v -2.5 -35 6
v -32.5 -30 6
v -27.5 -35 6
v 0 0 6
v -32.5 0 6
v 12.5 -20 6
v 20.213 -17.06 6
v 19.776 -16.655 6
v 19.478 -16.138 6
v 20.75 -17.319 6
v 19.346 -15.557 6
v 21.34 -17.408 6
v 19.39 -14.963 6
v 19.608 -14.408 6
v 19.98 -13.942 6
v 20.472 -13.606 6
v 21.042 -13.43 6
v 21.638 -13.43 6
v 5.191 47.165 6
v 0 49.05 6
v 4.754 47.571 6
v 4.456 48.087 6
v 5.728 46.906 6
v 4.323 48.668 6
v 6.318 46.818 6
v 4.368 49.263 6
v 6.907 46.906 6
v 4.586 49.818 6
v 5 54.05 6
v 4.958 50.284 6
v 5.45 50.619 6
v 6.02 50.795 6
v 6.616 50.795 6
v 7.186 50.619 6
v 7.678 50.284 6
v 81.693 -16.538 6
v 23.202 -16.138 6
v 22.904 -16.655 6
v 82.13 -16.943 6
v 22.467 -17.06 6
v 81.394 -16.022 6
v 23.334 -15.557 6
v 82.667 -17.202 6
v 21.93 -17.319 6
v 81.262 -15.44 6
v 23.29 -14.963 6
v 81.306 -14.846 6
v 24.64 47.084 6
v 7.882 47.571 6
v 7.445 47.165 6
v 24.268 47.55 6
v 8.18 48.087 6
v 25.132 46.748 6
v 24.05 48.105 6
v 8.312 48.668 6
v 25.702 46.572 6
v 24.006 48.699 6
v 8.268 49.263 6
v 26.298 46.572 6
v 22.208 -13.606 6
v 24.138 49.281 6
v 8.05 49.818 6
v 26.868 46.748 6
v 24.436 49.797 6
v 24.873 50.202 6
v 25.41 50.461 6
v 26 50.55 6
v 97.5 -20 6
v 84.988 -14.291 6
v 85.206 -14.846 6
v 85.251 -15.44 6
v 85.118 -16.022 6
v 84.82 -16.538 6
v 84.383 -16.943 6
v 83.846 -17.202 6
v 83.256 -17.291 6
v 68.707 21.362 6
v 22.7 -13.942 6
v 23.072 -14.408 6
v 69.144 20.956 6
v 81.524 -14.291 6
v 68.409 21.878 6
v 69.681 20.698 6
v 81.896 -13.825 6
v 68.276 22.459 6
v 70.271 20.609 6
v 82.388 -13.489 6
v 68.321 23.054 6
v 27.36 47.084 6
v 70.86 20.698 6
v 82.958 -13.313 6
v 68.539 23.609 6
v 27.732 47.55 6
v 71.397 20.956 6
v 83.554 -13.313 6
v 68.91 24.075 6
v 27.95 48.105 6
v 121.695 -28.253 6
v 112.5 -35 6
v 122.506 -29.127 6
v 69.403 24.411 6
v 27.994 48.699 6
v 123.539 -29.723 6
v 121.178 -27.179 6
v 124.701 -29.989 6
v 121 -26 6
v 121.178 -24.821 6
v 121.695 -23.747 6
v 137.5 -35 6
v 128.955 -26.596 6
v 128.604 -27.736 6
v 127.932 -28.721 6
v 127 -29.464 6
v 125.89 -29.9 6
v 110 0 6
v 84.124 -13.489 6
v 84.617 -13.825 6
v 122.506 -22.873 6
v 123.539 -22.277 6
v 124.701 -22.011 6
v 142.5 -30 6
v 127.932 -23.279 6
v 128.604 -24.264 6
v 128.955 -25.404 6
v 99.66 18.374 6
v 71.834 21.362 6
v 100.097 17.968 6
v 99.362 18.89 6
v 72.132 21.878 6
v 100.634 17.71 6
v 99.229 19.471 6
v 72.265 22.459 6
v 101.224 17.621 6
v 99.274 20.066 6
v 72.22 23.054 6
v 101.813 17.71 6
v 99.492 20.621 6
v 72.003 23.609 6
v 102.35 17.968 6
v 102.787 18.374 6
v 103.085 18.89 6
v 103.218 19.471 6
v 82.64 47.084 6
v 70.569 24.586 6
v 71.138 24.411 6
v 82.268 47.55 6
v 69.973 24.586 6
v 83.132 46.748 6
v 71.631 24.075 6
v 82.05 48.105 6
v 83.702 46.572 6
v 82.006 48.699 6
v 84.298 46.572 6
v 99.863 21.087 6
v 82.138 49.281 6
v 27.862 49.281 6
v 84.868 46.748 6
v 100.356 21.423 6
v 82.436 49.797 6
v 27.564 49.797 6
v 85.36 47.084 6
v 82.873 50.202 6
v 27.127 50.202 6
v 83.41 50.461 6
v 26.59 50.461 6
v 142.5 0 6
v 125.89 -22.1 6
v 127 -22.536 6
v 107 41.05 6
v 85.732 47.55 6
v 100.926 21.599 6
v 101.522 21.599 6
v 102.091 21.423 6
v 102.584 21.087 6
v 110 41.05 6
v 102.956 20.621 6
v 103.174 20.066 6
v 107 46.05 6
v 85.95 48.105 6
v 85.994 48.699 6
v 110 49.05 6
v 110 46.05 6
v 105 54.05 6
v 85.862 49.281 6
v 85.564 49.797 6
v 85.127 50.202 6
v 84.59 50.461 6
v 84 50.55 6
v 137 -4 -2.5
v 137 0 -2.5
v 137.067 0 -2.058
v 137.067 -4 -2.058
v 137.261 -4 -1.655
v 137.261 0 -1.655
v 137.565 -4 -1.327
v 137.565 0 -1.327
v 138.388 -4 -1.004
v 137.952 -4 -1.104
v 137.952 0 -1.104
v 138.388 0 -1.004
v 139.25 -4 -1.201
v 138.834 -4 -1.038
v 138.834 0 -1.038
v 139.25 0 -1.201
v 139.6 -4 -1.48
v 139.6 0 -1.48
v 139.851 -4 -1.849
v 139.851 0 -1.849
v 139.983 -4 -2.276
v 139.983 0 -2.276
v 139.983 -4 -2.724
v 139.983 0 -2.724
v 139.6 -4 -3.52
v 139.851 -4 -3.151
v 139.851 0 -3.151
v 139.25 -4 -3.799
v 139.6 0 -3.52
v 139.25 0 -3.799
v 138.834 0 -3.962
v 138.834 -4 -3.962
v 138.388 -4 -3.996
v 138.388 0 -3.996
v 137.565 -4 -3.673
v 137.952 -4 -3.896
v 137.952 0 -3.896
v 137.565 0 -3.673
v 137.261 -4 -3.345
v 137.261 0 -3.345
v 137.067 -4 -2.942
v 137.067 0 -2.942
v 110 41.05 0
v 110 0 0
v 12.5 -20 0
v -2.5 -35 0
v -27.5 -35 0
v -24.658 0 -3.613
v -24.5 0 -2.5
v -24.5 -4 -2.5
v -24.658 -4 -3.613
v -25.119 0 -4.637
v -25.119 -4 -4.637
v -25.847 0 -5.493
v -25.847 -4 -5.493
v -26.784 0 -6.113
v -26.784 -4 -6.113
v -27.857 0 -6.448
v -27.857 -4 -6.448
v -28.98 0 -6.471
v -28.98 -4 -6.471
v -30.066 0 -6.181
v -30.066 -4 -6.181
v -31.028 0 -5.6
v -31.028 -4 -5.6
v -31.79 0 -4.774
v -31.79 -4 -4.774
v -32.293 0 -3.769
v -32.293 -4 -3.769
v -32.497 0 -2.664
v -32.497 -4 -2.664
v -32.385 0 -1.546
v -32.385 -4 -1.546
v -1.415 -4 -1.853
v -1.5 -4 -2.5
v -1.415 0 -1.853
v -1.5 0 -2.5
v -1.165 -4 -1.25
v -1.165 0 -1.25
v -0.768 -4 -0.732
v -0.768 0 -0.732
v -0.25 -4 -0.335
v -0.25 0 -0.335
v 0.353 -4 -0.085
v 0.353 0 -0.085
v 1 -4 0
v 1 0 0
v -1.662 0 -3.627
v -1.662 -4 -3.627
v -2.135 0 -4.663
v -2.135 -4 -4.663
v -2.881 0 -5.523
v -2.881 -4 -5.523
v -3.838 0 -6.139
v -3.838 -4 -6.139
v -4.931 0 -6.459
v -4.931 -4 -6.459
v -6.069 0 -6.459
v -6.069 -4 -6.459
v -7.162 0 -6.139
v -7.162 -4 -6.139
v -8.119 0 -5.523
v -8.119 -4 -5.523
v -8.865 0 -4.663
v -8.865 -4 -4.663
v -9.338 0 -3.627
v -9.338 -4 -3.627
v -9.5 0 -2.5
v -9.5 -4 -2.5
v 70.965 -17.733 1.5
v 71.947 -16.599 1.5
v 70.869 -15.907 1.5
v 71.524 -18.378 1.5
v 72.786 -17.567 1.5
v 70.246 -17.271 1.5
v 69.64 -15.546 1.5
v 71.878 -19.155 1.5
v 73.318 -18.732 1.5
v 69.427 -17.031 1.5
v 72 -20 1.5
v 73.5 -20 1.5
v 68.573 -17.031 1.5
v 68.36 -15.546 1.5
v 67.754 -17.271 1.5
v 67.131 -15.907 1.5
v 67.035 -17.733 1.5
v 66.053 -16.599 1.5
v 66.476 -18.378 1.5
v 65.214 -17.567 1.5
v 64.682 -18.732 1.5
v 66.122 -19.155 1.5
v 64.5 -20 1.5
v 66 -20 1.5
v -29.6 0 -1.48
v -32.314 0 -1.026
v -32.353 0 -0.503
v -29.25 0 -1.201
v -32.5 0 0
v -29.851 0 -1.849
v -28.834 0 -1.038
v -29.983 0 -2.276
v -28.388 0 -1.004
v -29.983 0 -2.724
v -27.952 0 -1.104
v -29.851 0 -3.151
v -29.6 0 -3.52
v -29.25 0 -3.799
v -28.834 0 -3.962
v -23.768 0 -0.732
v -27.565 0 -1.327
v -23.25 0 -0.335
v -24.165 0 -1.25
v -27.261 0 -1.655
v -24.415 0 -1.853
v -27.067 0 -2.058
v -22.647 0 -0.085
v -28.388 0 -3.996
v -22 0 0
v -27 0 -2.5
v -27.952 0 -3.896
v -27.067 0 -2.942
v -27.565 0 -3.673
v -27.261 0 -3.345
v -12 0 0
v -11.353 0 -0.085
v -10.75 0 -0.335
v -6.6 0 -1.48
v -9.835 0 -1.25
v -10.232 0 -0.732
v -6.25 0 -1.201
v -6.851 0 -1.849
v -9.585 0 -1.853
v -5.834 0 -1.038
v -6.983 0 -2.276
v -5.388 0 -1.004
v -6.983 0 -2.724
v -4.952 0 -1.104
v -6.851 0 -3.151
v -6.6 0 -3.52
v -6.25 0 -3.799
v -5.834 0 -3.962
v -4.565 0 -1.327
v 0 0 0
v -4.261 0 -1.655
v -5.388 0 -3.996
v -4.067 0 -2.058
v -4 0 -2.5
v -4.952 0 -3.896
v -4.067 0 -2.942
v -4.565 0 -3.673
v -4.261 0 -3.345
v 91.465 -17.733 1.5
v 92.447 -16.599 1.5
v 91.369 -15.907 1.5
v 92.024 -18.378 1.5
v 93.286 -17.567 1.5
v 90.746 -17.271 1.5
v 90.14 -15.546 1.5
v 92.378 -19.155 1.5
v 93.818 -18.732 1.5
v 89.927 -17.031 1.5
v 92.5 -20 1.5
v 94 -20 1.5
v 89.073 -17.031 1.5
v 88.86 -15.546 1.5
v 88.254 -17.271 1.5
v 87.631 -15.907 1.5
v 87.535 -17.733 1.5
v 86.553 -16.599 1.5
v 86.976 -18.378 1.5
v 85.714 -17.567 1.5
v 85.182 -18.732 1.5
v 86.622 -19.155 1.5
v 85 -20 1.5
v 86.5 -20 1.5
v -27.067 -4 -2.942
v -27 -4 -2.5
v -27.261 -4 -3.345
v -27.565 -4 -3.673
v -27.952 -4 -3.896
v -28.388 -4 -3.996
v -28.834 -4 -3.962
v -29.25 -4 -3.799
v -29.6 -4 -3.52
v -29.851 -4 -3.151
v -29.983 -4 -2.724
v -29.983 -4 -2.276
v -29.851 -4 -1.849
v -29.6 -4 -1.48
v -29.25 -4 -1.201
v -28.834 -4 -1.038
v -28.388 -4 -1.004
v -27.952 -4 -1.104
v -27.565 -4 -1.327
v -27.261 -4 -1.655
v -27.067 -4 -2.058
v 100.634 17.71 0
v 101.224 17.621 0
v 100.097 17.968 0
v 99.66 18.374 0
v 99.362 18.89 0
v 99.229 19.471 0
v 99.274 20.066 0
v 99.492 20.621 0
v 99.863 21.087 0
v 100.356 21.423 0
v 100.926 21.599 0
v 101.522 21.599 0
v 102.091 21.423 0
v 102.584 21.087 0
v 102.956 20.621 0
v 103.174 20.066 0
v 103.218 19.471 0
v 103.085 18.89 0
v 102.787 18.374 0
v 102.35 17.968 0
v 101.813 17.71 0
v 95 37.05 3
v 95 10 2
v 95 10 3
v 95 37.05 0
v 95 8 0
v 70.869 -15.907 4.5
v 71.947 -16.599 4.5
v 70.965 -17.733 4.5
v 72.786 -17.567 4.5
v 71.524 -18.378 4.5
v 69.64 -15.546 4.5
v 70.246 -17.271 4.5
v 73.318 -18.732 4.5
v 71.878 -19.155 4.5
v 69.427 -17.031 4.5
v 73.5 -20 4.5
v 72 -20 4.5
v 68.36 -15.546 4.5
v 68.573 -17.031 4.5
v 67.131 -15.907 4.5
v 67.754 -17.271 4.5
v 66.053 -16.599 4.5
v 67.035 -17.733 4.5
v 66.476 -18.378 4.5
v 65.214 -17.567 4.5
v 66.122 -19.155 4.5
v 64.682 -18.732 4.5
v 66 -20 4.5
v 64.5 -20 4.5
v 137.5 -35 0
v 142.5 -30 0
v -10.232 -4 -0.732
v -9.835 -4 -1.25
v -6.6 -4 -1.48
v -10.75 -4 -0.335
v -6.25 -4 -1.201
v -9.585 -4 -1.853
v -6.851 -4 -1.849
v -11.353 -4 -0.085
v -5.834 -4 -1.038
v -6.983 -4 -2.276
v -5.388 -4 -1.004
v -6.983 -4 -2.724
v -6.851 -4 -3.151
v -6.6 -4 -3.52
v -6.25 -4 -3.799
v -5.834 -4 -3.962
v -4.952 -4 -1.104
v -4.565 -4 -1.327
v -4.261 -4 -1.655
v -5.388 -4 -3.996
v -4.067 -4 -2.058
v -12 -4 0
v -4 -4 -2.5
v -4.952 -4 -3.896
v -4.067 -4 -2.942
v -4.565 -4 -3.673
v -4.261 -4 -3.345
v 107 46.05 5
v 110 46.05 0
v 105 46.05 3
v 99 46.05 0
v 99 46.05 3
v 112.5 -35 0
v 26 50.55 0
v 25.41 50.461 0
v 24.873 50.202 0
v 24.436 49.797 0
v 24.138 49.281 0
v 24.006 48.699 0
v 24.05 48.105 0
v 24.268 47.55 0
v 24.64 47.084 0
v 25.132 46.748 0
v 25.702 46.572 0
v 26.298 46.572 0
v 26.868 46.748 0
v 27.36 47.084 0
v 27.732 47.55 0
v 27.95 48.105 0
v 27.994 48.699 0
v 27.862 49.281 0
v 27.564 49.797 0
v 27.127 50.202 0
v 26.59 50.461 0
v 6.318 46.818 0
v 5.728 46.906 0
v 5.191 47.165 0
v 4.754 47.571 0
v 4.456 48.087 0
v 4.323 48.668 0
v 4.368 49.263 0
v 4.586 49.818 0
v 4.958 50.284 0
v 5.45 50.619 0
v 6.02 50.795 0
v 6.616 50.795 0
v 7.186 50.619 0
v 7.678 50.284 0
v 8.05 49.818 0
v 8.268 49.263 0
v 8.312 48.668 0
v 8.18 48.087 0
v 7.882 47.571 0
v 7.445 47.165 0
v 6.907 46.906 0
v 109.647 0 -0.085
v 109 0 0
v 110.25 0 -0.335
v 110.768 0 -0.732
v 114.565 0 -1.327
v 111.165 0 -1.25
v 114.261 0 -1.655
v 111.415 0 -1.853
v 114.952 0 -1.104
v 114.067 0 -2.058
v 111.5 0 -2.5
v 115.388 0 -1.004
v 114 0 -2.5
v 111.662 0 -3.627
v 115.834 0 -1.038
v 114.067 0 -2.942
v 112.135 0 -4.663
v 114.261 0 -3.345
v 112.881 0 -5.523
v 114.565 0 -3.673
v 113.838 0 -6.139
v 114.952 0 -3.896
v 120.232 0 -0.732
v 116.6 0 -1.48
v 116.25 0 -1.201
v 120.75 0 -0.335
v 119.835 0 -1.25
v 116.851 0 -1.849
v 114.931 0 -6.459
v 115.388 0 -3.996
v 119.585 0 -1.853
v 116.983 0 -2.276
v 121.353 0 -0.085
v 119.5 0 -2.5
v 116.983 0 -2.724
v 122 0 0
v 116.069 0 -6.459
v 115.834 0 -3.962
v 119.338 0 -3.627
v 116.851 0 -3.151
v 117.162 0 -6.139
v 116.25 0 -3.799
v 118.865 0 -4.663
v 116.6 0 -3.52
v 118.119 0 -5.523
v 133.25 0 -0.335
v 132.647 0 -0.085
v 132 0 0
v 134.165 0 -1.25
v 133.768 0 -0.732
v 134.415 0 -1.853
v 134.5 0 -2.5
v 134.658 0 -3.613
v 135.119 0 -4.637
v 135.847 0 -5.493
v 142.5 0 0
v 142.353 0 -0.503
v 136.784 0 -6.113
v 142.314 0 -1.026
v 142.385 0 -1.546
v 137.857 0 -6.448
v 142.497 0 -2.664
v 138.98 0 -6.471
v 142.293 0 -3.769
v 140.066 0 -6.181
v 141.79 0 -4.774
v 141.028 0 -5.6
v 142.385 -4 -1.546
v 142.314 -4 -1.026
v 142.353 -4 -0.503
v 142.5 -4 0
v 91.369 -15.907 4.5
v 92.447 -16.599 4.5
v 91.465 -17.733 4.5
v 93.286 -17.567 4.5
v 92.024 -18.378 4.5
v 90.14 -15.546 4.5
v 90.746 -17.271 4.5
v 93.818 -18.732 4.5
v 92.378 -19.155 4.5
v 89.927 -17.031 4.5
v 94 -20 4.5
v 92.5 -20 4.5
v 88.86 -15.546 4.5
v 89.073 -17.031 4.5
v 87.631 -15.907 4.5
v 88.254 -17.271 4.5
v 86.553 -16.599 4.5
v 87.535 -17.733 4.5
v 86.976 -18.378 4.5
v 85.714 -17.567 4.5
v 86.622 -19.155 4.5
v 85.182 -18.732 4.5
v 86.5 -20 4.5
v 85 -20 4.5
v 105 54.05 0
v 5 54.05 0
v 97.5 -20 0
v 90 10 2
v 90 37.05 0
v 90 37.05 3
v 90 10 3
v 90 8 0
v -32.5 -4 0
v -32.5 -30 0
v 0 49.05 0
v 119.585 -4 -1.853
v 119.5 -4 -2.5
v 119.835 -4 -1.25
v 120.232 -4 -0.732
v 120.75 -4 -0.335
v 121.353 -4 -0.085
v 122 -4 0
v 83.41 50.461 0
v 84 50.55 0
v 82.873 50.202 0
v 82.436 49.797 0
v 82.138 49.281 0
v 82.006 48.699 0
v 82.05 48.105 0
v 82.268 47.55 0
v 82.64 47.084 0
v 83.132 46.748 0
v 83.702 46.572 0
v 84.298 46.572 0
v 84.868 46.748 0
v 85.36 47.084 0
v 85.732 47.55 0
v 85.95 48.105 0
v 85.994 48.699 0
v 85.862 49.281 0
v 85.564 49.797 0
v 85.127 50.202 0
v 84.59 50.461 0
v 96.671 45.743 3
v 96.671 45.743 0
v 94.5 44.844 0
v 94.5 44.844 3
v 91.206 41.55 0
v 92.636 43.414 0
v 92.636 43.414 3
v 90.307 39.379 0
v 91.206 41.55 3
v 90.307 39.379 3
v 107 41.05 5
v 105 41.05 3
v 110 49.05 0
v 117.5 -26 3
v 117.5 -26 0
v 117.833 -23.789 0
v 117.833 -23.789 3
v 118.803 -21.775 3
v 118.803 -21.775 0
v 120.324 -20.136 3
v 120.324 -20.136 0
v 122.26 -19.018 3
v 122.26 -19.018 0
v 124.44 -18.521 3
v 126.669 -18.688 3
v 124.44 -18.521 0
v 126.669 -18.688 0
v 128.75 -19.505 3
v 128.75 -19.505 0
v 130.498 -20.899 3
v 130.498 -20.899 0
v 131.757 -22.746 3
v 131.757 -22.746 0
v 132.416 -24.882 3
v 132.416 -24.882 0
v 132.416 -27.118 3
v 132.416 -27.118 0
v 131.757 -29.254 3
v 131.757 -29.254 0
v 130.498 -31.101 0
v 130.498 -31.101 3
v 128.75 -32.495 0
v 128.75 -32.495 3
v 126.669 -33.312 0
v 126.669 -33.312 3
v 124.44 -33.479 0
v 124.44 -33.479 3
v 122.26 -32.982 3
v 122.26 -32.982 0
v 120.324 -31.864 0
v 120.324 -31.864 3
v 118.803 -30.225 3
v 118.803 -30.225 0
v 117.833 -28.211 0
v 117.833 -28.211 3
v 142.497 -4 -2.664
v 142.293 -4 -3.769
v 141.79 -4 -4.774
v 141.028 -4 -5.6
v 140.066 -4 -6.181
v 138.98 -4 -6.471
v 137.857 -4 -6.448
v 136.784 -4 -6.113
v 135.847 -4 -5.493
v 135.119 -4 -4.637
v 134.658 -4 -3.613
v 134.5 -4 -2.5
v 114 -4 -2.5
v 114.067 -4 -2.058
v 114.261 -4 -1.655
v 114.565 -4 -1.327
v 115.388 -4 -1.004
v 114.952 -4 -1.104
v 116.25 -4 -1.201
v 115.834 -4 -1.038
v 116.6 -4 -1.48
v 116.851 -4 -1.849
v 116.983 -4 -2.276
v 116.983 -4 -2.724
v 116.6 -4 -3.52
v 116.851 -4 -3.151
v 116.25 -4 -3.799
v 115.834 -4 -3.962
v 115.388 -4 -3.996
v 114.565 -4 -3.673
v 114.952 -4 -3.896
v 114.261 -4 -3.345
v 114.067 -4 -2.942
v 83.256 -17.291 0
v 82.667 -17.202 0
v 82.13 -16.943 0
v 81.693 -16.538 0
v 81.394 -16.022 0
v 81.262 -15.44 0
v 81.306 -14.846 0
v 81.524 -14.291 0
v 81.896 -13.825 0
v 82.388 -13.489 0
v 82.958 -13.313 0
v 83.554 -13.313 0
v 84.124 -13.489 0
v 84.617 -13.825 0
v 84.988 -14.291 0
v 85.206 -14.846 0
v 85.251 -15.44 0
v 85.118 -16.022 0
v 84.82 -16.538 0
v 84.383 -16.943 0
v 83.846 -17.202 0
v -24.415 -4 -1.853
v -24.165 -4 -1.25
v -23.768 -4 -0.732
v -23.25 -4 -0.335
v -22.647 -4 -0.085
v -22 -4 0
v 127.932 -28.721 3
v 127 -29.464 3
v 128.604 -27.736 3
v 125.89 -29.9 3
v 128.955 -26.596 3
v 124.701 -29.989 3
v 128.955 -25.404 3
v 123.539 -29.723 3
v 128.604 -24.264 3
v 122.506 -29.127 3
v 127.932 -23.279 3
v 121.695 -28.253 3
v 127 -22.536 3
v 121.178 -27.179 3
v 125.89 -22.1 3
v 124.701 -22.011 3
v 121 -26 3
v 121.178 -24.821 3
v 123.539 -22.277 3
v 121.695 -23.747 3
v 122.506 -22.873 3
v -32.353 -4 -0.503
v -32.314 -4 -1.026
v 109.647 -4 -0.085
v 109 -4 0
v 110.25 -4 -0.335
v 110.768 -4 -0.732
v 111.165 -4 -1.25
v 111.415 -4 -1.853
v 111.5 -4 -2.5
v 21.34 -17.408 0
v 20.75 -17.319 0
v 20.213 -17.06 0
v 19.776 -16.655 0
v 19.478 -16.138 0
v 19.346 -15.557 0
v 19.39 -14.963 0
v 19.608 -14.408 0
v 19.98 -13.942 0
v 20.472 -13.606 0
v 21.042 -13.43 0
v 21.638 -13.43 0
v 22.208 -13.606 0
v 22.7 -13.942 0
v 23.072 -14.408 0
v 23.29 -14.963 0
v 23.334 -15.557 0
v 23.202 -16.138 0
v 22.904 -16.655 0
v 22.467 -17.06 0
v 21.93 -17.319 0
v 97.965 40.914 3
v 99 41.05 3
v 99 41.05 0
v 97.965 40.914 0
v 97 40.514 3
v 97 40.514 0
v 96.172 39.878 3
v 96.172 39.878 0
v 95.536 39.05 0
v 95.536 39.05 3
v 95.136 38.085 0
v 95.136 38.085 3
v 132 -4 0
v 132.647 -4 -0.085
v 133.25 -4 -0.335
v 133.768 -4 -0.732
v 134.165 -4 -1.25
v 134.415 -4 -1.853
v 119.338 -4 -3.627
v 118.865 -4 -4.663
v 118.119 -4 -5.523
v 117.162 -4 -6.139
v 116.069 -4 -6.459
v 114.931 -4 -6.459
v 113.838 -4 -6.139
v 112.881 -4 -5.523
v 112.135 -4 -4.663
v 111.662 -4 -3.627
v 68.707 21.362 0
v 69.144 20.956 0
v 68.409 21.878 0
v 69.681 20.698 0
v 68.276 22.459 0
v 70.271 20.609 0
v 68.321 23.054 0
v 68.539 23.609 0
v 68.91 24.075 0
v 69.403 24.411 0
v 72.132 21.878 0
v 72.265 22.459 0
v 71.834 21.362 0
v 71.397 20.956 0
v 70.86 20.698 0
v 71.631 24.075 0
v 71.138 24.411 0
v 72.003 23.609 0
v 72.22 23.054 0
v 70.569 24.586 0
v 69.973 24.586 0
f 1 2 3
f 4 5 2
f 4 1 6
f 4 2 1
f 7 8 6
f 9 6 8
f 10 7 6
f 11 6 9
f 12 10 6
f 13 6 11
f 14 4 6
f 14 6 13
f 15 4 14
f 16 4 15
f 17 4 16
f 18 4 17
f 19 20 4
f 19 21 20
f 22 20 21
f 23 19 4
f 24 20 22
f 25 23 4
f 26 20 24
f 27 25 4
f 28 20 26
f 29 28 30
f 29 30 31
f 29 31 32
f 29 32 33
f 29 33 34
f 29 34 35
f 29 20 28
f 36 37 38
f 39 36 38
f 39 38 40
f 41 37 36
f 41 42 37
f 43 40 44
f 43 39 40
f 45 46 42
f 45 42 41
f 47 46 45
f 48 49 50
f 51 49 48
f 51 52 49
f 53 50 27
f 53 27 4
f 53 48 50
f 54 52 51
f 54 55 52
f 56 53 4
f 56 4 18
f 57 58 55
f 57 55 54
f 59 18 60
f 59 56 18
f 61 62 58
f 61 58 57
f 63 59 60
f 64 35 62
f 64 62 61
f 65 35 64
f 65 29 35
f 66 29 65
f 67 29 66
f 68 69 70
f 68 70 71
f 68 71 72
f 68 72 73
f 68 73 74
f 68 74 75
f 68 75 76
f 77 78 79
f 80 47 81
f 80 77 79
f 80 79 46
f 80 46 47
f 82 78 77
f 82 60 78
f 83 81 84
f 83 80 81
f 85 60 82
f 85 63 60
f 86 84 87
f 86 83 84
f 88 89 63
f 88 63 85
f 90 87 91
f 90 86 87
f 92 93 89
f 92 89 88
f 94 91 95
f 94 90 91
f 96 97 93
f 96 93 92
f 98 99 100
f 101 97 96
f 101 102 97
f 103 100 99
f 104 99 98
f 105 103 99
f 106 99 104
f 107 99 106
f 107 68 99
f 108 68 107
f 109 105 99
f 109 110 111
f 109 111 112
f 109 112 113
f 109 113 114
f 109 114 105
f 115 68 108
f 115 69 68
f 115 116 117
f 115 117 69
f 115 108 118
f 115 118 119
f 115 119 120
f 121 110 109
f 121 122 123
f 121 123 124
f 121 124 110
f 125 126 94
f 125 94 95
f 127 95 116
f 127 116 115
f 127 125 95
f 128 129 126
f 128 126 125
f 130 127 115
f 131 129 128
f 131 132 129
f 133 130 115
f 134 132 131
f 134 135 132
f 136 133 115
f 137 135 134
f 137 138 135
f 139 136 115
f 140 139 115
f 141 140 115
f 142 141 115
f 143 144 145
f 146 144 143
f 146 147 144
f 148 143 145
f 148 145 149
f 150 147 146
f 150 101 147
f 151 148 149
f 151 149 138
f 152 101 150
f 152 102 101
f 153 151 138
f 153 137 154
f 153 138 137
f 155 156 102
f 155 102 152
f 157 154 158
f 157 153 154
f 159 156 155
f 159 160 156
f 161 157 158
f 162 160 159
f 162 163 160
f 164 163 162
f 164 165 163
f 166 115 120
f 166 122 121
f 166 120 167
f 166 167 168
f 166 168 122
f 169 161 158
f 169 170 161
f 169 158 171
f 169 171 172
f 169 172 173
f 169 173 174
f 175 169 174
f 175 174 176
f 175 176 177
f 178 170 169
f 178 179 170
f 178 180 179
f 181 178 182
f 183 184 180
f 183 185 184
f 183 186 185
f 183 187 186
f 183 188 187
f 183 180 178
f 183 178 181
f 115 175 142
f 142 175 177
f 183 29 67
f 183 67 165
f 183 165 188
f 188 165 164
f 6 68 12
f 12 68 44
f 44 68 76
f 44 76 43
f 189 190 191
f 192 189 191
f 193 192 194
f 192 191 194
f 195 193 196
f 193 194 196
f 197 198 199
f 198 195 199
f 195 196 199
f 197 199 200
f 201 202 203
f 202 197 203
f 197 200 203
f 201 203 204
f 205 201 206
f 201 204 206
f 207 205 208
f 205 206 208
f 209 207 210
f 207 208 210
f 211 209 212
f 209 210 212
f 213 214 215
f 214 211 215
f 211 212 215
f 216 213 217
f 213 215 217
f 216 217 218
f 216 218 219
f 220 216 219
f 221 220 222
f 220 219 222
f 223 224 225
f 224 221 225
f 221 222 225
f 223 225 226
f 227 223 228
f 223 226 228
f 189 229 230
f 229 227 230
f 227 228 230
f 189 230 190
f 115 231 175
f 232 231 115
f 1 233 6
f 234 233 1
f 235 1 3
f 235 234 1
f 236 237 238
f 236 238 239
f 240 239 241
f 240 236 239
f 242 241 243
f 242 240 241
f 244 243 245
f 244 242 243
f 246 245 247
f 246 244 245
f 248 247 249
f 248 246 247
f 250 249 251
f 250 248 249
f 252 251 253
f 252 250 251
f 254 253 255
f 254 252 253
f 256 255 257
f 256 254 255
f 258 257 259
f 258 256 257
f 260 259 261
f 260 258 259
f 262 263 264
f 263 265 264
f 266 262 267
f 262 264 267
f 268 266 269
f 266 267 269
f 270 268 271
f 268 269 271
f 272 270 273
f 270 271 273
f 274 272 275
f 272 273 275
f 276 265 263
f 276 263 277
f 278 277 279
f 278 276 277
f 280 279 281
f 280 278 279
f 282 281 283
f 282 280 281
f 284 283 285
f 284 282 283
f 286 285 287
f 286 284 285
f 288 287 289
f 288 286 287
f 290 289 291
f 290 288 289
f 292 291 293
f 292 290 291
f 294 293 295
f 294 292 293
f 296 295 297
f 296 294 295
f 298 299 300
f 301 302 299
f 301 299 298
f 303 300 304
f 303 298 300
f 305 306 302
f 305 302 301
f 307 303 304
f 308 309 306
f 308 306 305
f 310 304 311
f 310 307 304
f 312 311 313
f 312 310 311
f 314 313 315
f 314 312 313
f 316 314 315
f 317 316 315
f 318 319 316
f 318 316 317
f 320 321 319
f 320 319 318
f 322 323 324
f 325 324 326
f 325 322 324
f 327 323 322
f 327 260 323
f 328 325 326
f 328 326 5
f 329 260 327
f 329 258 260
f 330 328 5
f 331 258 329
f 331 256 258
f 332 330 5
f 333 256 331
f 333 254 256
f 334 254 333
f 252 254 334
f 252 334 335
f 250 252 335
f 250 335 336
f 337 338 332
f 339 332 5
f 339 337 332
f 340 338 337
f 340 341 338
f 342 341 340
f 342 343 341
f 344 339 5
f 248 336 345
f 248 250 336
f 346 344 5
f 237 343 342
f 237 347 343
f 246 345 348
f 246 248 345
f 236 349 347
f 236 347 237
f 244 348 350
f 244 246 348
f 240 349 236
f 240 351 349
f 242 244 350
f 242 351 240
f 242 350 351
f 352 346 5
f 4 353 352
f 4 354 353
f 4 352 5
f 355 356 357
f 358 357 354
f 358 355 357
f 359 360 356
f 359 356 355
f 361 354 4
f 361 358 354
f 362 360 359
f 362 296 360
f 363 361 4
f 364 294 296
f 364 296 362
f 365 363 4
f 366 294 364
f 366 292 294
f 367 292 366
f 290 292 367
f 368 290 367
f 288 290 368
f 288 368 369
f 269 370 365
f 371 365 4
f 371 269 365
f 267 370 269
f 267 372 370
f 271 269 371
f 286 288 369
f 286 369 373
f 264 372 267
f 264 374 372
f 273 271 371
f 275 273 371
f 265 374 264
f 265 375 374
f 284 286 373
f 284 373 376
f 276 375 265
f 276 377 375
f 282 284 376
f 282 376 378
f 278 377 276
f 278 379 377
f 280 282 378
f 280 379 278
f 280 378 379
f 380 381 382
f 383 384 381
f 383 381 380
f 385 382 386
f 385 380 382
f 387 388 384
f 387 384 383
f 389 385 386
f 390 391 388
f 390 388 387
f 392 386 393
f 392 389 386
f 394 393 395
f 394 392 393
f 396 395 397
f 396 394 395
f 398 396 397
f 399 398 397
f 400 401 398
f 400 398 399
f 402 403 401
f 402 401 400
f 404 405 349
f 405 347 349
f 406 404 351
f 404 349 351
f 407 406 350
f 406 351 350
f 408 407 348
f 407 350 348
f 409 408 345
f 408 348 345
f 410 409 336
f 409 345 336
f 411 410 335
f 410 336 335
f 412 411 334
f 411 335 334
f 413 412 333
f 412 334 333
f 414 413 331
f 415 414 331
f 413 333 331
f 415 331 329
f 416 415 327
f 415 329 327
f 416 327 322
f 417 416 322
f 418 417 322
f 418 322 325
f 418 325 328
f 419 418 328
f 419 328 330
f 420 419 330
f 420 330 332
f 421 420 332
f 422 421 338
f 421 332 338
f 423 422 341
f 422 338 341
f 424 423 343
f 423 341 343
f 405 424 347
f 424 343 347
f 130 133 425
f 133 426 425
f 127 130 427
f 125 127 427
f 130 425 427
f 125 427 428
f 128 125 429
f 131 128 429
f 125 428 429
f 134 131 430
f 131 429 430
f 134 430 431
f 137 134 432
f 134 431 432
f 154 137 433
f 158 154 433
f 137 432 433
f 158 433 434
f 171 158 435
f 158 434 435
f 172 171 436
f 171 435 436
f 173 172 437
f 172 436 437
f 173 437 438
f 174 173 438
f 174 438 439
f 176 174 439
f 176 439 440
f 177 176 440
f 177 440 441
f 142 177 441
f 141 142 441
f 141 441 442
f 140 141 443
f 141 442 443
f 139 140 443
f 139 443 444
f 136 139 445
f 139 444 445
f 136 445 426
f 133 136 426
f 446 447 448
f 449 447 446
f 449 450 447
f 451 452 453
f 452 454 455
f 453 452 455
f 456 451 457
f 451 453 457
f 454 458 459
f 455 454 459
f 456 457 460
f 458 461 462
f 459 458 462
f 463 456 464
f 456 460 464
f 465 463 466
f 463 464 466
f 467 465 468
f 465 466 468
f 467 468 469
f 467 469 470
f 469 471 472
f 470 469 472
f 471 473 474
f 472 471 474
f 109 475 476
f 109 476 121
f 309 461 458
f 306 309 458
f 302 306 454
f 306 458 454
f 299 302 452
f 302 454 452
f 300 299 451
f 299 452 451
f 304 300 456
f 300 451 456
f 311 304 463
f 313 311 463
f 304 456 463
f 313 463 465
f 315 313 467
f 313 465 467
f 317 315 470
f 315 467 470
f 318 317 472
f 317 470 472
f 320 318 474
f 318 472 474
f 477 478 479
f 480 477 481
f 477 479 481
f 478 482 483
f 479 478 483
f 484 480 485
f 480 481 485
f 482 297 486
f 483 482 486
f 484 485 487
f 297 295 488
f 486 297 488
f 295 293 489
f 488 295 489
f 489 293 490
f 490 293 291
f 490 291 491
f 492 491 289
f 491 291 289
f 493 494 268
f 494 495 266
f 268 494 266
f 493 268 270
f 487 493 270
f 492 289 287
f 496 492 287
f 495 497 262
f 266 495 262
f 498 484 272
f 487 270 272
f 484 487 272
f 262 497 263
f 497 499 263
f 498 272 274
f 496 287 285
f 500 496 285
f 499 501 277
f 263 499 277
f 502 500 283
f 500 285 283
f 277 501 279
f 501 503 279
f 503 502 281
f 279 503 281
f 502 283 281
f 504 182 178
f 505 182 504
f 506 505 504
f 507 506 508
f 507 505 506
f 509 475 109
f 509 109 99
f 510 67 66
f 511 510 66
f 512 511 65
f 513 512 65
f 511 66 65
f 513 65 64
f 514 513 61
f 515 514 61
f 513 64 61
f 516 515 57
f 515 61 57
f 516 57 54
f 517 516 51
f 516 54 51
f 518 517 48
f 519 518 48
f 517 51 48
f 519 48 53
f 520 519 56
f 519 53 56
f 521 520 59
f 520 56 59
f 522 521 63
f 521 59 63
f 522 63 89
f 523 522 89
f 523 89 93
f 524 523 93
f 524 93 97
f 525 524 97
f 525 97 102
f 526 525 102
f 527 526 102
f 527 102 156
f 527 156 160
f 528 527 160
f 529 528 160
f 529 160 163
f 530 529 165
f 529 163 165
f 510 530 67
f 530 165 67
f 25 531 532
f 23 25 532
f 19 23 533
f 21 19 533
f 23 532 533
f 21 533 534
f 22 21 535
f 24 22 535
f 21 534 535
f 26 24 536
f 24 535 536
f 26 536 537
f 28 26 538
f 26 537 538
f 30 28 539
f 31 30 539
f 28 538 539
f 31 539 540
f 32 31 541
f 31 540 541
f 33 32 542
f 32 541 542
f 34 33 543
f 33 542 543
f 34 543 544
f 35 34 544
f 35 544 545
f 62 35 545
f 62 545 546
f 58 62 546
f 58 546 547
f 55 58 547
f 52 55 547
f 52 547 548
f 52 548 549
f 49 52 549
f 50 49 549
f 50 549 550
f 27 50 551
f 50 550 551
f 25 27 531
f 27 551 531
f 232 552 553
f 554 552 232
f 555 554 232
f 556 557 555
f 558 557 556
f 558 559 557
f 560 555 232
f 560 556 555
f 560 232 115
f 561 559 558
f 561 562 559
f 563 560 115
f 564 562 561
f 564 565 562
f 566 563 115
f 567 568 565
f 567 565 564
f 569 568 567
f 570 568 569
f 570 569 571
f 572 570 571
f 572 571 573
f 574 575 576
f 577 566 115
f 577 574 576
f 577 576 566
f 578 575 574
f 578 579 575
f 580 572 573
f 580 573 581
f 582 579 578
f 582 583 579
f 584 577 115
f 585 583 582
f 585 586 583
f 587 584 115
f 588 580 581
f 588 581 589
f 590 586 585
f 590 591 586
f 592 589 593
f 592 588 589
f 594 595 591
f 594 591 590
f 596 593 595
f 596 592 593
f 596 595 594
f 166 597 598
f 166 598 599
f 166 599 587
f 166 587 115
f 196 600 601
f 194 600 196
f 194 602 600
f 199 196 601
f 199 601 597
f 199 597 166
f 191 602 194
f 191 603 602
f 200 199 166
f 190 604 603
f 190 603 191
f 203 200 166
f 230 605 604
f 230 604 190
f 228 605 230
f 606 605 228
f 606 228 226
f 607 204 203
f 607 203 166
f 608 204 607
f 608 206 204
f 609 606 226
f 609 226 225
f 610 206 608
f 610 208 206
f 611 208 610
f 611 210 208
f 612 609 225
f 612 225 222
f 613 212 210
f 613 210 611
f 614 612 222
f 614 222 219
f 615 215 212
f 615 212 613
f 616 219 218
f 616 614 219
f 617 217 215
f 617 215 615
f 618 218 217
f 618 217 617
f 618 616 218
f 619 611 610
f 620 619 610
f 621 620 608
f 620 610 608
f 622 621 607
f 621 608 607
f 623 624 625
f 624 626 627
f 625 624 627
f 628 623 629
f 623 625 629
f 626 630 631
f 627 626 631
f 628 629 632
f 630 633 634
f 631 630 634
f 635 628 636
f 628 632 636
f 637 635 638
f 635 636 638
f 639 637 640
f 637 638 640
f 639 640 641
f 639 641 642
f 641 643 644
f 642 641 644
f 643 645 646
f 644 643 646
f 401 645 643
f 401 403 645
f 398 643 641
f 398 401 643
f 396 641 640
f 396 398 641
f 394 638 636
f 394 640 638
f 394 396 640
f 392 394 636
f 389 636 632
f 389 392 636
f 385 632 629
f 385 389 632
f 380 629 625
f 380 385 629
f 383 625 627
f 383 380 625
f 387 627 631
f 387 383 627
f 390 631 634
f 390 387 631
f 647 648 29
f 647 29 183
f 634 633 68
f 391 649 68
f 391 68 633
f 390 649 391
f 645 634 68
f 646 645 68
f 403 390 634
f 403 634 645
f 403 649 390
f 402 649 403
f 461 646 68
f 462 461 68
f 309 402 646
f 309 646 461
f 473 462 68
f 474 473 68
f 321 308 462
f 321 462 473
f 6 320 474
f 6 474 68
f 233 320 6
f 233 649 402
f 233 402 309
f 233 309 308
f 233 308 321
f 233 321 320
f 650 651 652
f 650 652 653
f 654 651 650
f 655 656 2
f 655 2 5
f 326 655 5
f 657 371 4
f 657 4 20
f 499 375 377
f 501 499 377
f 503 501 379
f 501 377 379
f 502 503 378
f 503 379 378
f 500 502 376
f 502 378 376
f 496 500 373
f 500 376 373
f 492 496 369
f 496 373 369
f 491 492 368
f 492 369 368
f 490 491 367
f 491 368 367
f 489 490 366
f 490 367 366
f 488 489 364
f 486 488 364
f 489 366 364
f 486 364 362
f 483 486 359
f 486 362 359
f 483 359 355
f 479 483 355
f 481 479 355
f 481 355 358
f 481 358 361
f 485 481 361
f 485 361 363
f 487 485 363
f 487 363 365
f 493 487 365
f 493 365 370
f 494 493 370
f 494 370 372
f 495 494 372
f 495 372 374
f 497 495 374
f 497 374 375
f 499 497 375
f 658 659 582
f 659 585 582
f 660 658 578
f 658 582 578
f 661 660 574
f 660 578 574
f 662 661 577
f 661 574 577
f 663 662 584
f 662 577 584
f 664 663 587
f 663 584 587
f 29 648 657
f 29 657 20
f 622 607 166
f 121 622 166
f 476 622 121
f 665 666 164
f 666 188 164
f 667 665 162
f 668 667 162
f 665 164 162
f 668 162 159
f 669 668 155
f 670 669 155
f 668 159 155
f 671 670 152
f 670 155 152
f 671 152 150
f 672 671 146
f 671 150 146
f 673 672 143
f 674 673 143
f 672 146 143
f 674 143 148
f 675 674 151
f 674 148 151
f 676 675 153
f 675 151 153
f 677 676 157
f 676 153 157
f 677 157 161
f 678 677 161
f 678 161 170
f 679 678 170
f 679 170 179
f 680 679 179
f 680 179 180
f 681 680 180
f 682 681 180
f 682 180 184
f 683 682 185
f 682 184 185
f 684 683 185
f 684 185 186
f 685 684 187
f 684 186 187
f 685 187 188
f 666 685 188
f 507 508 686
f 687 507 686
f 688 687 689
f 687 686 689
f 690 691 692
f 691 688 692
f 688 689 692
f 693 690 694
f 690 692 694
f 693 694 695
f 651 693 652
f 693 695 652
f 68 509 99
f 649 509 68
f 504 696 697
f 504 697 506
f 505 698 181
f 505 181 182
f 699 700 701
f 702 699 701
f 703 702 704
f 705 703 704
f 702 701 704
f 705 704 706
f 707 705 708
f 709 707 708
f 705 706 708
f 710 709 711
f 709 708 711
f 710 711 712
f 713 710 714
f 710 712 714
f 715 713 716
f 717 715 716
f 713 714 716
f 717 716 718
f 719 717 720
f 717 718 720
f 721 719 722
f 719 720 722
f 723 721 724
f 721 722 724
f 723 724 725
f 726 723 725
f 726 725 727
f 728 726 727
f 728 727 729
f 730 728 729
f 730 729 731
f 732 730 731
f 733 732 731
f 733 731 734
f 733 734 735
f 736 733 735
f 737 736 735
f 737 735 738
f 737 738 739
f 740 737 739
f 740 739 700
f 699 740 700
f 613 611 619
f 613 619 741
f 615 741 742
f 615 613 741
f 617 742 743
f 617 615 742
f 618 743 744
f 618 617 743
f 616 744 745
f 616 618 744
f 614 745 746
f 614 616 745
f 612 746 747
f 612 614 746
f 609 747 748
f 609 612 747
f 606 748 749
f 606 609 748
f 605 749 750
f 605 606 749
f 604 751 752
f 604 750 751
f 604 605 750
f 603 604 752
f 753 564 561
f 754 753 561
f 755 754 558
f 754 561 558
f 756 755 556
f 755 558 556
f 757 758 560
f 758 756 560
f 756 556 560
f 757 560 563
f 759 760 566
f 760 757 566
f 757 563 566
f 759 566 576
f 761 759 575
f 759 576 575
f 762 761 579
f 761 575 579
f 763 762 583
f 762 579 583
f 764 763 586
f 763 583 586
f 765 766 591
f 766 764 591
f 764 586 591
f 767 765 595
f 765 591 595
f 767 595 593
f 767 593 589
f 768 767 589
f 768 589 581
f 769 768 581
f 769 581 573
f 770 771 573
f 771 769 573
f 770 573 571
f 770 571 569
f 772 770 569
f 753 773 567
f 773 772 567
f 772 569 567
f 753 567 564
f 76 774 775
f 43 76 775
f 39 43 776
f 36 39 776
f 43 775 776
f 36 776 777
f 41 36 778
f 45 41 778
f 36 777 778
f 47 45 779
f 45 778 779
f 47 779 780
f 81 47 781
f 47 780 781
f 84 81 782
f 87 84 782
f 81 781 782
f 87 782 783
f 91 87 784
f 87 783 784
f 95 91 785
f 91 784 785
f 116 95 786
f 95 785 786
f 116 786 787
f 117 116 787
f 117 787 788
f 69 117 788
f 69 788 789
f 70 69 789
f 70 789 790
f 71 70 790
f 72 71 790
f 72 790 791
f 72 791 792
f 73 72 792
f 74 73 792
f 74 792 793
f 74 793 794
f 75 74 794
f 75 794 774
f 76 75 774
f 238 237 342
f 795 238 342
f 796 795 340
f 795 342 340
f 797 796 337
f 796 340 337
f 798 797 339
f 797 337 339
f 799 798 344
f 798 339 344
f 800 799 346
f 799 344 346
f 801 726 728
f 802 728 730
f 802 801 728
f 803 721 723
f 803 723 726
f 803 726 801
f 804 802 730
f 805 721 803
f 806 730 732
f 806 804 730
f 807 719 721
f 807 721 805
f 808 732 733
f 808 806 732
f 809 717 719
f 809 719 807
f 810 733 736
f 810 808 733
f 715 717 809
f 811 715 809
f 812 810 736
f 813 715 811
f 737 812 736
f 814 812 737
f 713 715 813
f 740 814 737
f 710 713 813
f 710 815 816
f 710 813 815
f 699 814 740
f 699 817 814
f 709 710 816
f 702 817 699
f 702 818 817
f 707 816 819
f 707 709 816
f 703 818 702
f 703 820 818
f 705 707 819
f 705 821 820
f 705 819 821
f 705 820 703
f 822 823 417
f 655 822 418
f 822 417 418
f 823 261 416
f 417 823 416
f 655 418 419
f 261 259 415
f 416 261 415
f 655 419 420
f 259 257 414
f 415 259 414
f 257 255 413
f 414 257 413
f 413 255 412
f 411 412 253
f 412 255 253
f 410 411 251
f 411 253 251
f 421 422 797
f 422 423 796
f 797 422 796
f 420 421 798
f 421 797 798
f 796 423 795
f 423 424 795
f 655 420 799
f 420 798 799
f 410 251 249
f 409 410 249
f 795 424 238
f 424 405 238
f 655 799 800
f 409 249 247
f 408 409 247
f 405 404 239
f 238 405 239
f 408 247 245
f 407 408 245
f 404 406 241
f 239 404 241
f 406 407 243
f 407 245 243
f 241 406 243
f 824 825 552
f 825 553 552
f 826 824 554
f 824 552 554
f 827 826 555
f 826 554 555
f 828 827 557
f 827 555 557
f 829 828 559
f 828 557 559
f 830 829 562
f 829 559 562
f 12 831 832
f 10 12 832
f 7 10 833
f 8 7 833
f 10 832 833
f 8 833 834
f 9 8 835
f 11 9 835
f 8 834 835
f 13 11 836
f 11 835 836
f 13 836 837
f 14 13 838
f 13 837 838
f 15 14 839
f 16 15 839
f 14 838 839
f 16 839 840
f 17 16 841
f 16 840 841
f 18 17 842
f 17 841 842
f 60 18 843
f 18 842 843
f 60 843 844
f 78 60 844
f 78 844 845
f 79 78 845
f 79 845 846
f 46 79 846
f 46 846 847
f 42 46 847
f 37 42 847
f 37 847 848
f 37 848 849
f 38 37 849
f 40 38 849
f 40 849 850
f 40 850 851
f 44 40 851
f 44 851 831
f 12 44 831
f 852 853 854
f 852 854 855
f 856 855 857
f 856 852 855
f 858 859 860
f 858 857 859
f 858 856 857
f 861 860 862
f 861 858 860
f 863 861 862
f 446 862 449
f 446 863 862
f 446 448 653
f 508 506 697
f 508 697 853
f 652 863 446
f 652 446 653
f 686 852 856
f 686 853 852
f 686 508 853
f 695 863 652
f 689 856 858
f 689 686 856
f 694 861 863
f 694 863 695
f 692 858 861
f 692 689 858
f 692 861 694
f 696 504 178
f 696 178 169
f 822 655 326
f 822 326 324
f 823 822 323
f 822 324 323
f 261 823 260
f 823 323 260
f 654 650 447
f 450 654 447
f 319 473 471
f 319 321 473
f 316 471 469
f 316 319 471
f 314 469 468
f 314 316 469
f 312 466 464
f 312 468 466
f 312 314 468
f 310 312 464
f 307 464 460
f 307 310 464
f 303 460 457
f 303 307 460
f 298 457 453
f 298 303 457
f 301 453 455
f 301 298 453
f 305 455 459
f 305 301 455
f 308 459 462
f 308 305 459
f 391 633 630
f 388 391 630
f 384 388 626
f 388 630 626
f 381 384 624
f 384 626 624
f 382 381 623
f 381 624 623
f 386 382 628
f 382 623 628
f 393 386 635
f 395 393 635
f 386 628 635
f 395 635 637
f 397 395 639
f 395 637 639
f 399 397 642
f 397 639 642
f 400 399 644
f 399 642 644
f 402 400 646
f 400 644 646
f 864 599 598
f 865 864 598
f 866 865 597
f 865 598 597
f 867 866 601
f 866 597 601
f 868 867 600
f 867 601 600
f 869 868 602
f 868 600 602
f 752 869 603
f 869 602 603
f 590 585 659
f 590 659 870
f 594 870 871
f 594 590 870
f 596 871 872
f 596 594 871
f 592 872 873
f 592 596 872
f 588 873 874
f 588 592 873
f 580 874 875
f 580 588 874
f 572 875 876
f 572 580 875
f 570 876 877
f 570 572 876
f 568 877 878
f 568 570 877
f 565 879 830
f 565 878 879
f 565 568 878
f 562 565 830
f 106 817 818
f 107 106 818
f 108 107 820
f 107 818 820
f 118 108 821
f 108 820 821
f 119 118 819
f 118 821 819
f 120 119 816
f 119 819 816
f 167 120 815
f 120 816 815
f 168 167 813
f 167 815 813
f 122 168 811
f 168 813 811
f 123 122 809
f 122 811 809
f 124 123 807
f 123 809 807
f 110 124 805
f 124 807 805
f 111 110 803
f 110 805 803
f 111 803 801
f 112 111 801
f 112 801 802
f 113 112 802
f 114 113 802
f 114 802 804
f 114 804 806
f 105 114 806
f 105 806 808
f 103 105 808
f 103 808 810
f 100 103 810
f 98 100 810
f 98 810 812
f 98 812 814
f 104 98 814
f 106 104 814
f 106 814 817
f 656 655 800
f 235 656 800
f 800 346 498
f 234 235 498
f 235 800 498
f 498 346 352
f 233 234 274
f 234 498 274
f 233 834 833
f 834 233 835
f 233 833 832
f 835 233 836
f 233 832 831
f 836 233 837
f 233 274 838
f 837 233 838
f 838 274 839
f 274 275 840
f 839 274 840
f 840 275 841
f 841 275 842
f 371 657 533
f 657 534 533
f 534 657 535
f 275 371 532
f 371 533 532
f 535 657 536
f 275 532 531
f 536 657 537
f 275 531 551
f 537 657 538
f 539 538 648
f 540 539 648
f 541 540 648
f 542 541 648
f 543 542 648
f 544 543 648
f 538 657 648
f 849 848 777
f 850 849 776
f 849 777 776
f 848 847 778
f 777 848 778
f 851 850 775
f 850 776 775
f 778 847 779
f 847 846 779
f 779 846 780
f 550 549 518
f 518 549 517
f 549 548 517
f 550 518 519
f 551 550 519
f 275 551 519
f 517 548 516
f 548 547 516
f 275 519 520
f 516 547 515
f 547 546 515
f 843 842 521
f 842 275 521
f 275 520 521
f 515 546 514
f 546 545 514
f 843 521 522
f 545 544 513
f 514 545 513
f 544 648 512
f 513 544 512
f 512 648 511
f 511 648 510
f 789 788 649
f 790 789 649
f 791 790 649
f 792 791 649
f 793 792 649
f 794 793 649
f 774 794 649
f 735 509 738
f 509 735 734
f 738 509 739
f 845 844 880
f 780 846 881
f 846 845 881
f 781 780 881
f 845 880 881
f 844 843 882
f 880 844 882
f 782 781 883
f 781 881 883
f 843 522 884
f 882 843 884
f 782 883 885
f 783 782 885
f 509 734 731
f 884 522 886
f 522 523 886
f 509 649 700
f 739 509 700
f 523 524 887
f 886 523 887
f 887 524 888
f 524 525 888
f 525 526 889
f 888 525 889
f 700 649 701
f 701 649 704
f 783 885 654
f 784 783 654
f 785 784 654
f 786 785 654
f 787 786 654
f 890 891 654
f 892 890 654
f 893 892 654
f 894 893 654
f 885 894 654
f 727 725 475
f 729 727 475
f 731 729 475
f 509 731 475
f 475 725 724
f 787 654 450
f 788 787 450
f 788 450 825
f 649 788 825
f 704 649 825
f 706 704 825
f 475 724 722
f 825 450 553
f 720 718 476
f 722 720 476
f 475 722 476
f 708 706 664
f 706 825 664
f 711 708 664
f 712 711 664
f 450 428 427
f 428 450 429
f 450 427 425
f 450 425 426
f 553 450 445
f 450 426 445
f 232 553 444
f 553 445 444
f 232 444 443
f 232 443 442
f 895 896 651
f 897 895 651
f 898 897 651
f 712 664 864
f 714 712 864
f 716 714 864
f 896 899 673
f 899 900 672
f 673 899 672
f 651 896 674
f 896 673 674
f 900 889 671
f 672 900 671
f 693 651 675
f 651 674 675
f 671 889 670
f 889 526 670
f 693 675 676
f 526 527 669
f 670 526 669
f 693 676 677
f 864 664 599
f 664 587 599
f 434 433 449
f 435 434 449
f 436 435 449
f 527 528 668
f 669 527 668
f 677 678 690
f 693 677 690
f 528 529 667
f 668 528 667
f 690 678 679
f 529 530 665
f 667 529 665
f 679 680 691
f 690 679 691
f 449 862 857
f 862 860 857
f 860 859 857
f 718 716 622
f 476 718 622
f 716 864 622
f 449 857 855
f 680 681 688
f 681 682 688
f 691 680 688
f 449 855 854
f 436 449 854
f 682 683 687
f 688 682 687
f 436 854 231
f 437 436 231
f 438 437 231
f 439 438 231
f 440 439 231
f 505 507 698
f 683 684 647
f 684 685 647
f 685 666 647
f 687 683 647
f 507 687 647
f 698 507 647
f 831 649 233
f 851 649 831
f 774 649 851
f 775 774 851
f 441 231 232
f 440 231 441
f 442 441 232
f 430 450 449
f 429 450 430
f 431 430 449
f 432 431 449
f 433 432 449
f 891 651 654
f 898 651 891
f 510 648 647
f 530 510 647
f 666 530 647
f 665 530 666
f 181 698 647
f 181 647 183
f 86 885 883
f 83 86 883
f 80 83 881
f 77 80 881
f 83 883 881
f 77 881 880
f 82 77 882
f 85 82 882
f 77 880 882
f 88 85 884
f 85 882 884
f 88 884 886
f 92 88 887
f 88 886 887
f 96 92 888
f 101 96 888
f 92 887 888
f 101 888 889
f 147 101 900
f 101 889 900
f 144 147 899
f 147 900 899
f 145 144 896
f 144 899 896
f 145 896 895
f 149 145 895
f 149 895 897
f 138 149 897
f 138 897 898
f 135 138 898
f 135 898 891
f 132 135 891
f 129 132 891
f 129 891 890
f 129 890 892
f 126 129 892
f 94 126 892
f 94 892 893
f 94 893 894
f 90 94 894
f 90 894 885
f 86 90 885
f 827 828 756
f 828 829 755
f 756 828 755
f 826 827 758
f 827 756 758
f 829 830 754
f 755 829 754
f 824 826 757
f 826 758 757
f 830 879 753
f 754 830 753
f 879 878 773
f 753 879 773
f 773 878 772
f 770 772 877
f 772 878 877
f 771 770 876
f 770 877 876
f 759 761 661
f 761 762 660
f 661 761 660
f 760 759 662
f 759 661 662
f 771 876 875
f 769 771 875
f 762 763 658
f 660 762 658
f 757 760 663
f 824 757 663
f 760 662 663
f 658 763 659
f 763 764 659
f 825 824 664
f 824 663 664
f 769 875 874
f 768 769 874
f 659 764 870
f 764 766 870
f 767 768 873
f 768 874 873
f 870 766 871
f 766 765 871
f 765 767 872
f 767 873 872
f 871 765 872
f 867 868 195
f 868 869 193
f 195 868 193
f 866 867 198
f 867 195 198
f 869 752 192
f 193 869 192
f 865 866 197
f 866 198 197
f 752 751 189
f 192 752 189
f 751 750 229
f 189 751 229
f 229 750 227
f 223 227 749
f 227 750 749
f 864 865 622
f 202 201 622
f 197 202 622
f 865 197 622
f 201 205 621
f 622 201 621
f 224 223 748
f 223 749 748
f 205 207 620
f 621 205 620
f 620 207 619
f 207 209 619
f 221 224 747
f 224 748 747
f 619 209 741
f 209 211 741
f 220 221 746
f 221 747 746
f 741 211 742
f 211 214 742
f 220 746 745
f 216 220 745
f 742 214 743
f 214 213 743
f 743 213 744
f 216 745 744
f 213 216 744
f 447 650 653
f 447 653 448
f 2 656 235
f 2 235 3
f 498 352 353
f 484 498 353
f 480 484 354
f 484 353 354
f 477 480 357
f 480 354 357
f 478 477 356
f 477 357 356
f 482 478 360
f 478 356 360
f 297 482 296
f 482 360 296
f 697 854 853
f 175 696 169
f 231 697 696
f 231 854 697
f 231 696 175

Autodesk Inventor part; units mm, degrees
ref_plane "YZ Plane" through (0, 0, 0) normal (1, 0, 0) x (0, 1, 0)
ref_plane "XZ Plane" through (0, 0, 0) normal (0, 1, 0) x (-1, 0, 0)
sketch "Sketch1" plane through (0, 0, 0) normal (0, 0, 1) x (1, 0, 0)
  line L0 (-32.5, 0) -> (0, 0)
  line L1 (0, 0) -> (0, 54.05)
  line L2 (0, 54.05) -> (110, 54.05)
  line L3 (110, 54.05) -> (110, 0)
  line L4 (110, 0) -> (142.5, 0)
  line L5 (142.5, 0) -> (142.5, -35)
  line L6 (142.5, -35) -> (112.5, -35)
  line L7 (112.5, -35) -> (97.5, -20)
  line L8 (97.5, -20) -> (12.5, -20)
  line L9 (12.5, -20) -> (-2.5, -35)
  line L10 (-2.5, -35) -> (-32.5, -35)
  line L11 (-32.5, -35) -> (-32.5, 0)
  dimension "d0" = 135
  dimension "d1" = 135
  dimension "d2" = 110
  dimension "d3" = 54.05
  dimension "d4" = 35
  dimension "d5" = 32.5
  dimension "d6" = 20
  dimension "d7" = 30
extrude "Extrusion1" add sketch "Sketch1" along normal blind 6
chamfer "Chamfer1" distance 5 angle 45 4 edges at (0, 54.05, 3) (110, 54.05, 3) (-32.5, -35, 3) (142.5, -35, 3)
sketch "Sketch2" plane through (110, 0, 0) normal (0, 1, 0) x (1, 0, 0)
  circle A0 centre (-138.5, 2.5) radius 1.5
  circle A1 centre (-115.5, 2.5) radius 1.5
  line L0 (-142.5, 0) -> (-142.5, -6) projected
  line L1 (-110, 0) -> (-142.5, 0) projected
  circle A2 centre (-138.5, 2.5) radius 4
  line L2 (-142.5, 0) -> (-112.5, 0) projected
  arc A3 (-142.5, 0) -> (-142.3846, 1.5461) centre (-144.8125, 0.95) ccw
  arc A4 (-134.5, 2.5) -> (-132, 0) centre (-132, 2.5) ccw
  arc A5 (-122, 0) -> (-119.5, 2.5) centre (-122, 2.5) ccw
  arc A6 (-111.5, 2.5) -> (-109, 0) centre (-109, 2.5) ccw
  circle A7 centre (-115.5, 2.5) radius 4
  line L3 (-109, 0) -> (-112.3775, 0)
  line L4 (-112.5, 0) -> (-97.5, 0) projected
  point P0 (-122, 0)
  point P1 (-132, 0)
  point P2 (-118.6225, 0)
  point P3 (-112.3775, 0)
  dimension "d13" = 3
  dimension "d14" = 3
  dimension "d15" = 4
  dimension "d16" = 27
  dimension "d17" = 2.5
  dimension "d18" = 8
extrude "Extrusion2" add sketch "Sketch2" against normal blind 4 contours L1 A2 A4 | L1 A7 A6 L3 | L1 A7 | L1 A5 A7 | L1 A2 | L1 A3 A2 picked at (-115.6011, 0.337) picked at (-138.4397, 0.337)
sketch "Sketch3" plane through (0, 0, 0) normal (0, 0, -1) x (-1, 0, 0)
  line L0 (-105, 54.05) -> (-5, 54.05) projected
  line L1 (0, 49.05) -> (0, 0) projected
  line L2 (-110, 0) -> (-110, 49.05) projected
  point P0 (-84, 48.55)
  point P1 (-26, 48.55)
  dimension "d21" = 5.5
  dimension "d22" = 26
  dimension "d23" = 26
hole "Hole1" at (84, 48.55, 0) at (26, 48.55, 0) direction (0, 0, 1) diameter 4 depth 24
sketch "Sketch4" plane through (12.5, -20, 0) normal (0, -1, 0) x (1, 0, 0)
  line L0 (74, 1.5) -> (72.5, 1.5)
  line L1 (72.5, 1.5) -> (72.5, 4.5)
  line L2 (72.5, 4.5) -> (74, 4.5)
  line L3 (74, 4.5) -> (74, 1.5)
  line L4 (77, 1.5) -> (77, 4.5)
  line L5 (-15, 0) -> (-15, 6) projected
  line L6 (85, 0) -> (85, 6) projected
  line L7 (53.5, 1.5) -> (52, 1.5)
  line L8 (52, 1.5) -> (52, 4.5)
  line L9 (52, 4.5) -> (53.5, 4.5)
  line L10 (53.5, 4.5) -> (53.5, 1.5)
  line L11 (56.5, 1.5) -> (56.5, 4.5)
  point P0 (-12.5, 0)
  point P1 (72.5, 3)
  point P2 (-15, 3)
  point P3 (77, 3)
  point P4 (74, 3)
  point P5 (53.5, 3)
  point P6 (56.5, 3)
  dimension "d31" = 1.5
  dimension "d32" = 3
  dimension "d33" = 3
  dimension "d35" = 8
  dimension "d36" = 1.5
  dimension "d37" = 3
  dimension "d38" = 3
  dimension "d39" = 16
revolve "Revolution1" cut sketch "Sketch4" angle 360 about axis through (89.5, -20, 1.5) along (0, 0, 1) contours L0 L1 L2 L3
revolve "Revolution2" cut sketch "Sketch4" angle 360 about axis through (69, -20, 1.5) along (0, 0, 1) contours L7 L8 L9 L10
ref_plane "Work Plane1" through (55, 0, 6) normal (1, 0, 0) x (0, 0, -1)
mirror "Mirror1" about plane through (55, 0, 6) normal (1, 0, 0) of "Extrusion2"
sketch "Sketch5" plane through (0, 0, 6) normal (0, 0, 1) x (1, 0, 0)
  circle A0 centre (101.2237, 19.6209) radius 1.6
  circle A1 centre (70.2706, 22.6087) radius 1.6
  circle A2 centre (21.34, -15.4078) radius 1.6
  circle A3 centre (83.2562, -15.291) radius 1.6
  circle A4 centre (6.3179, 48.8175) radius 1.6
  circle A5 centre (70.2706, 22.6087) radius 4
  circle A6 centre (101.2237, 19.6209) radius 4
  circle A7 centre (83.2562, -15.291) radius 4
  circle A8 centre (21.34, -15.4078) radius 4
  circle A9 centre (6.3179, 48.8175) radius 4
  line L0 (109, 0) -> (109, -4) projected
  line L1 (12.5, -20) -> (97.5, -20) projected
  line L2 (110, 0) -> (97.5, -20)
  circle A10 centre (26, 48.55) radius 2
  circle A11 centre (84, 48.55) radius 2
  circle A12 centre (26, 48.55) radius 4
  circle A13 centre (84, 48.55) radius 4
  circle A14 centre (84, 48.55) radius 2
  circle A15 centre (26, 48.55) radius 2
  line L3 (105, 54.05) -> (110, 49.05) projected
  line L4 (105, 54.05) -> (5, 54.05) projected
  line L5 (0, 49.05) -> (5, 54.05) projected
  line L6 (0, 49.05) -> (0, 0) projected
  line L7 (0, 0) -> (-32.5, 0) projected
  line L8 (-32.5, 0) -> (-32.5, -30) projected
  line L9 (-27.5, -35) -> (-2.5, -35) projected
  line L10 (-2.5, -35) -> (12.5, -20) projected
  line L11 (12.5, -20) -> (97.5, -20) projected
  line L12 (97.5, -20) -> (112.5, -35) projected
  line L13 (112.5, -35) -> (137.5, -35) projected
  line L14 (142.5, -30) -> (142.5, 0) projected
  line L15 (142.5, 0) -> (110, 0) projected
  line L16 (110, 0) -> (110, 49.05) projected
  line L17 (0, 49.05) -> (5, 54.05) projected
  line L18 (105, 54.05) -> (5, 54.05) projected
  line L19 (105, 54.05) -> (110, 49.05) projected
  line L20 (142.5, -30) -> (137.5, -35) projected
  line L21 (-27.5, -35) -> (-32.5, -30) projected
  circle A16 centre (6.3179, 48.8175) radius 1.6
  circle A17 centre (21.34, -15.4078) radius 1.6
  circle A18 centre (70.2706, 22.6087) radius 1.6
  circle A19 centre (101.2237, 19.6209) radius 1.6
  circle A20 centre (83.2562, -15.291) radius 1.6
  line L22 (110, 0) -> (110, 49.05) projected
  line L23 (0, 49.05) -> (0, 0) projected
  dimension "d41" = 8
  dimension "d82" = 5.5
  dimension "d83" = 5.5
  dimension "d84" = 26
  dimension "d85" = 26
hole "Hole2" at (6.3179, 48.8175, 6) at (70.2706, 22.6087, 6) at (101.2237, 19.6209, 6) at (83.2562, -15.291, 6) at (21.34, -15.4078, 6) direction (0, 0, -1) diameter 4 depth 24
sketch "Sketch6" plane through (0, 0, 0) normal (0, 0, -1) x (-1, 0, 0)
  line L0 (-110, 0) -> (-110, 49.05) projected
  line L1 (-110, 46.05) -> (-107, 46.05)
  line L2 (-107, 46.05) -> (-90, 46.05)
  line L3 (-90, 46.05) -> (-90, 10)
  line L4 (-90, 10) -> (-95, 10)
  line L5 (-95, 10) -> (-95, 41.05)
  line L6 (-95, 41.05) -> (-110, 41.05)
  line L7 (-110, 0) -> (-110, 49.05) projected
  line L8 (-12.5, -20) -> (-97.5, -20) projected
  line L9 (-107, 46.05) -> (-107, 41.05)
  point P0 (0, 0)
  dimension "d49" = 30
  dimension "d50" = 5
  dimension "d51" = 5
  dimension "d55" = 15
  dimension "d68" = 3
  dimension "d69" = 3
extrude "Extrusion3" cut sketch "Sketch6" against normal blind 3
extrude "Extrusion4" cut sketch "Sketch6" against normal through all contours L0 L1 L9 L6
fillet "Fillet1" radius 4 1 edges at (95, 41.05, 1.5)
fillet "Fillet2" radius 9 1 edges at (90, 46.05, 1.5)
chamfer "Chamfer2" distance 2 angle 45 2 edges at (92.5, 10, 0) (107, 43.55, 3)
sketch "Sketch7" plane through (0, 0, 0) normal (0, 0, -1) x (-1, 0, 0)
  circle A0 centre (-125, -26) radius 4
  circle A1 centre (-125, -26) radius 5 construction
  circle A2 centre (-125, -26) radius 9 construction
  line L0 (-112.5, -35) -> (-137.5, -35) projected
  circle A3 centre (-125, -26) radius 7.5
  point P0 (0, 0)
  point P1 (-125, -35)
  dimension "d70" = 8
  dimension "d71" = 10
  dimension "d72" = 18
  dimension "d75" = 15
extrude "Extrusion5" cut sketch "Sketch7" against normal through all contours A0
extrude "Extrusion6" cut sketch "Sketch7" against normal blind 3 contours A0 | A3
equation "\"d51\" = d50"
equation "\"d61\" = d60 + d50"
equation "\"MotorHeight\" = MotorHeightBase"
equation "\"d60\" = 4"
equation "\"MotorHeightBase\" = 28"
properties part number "Driver Board Mount"
